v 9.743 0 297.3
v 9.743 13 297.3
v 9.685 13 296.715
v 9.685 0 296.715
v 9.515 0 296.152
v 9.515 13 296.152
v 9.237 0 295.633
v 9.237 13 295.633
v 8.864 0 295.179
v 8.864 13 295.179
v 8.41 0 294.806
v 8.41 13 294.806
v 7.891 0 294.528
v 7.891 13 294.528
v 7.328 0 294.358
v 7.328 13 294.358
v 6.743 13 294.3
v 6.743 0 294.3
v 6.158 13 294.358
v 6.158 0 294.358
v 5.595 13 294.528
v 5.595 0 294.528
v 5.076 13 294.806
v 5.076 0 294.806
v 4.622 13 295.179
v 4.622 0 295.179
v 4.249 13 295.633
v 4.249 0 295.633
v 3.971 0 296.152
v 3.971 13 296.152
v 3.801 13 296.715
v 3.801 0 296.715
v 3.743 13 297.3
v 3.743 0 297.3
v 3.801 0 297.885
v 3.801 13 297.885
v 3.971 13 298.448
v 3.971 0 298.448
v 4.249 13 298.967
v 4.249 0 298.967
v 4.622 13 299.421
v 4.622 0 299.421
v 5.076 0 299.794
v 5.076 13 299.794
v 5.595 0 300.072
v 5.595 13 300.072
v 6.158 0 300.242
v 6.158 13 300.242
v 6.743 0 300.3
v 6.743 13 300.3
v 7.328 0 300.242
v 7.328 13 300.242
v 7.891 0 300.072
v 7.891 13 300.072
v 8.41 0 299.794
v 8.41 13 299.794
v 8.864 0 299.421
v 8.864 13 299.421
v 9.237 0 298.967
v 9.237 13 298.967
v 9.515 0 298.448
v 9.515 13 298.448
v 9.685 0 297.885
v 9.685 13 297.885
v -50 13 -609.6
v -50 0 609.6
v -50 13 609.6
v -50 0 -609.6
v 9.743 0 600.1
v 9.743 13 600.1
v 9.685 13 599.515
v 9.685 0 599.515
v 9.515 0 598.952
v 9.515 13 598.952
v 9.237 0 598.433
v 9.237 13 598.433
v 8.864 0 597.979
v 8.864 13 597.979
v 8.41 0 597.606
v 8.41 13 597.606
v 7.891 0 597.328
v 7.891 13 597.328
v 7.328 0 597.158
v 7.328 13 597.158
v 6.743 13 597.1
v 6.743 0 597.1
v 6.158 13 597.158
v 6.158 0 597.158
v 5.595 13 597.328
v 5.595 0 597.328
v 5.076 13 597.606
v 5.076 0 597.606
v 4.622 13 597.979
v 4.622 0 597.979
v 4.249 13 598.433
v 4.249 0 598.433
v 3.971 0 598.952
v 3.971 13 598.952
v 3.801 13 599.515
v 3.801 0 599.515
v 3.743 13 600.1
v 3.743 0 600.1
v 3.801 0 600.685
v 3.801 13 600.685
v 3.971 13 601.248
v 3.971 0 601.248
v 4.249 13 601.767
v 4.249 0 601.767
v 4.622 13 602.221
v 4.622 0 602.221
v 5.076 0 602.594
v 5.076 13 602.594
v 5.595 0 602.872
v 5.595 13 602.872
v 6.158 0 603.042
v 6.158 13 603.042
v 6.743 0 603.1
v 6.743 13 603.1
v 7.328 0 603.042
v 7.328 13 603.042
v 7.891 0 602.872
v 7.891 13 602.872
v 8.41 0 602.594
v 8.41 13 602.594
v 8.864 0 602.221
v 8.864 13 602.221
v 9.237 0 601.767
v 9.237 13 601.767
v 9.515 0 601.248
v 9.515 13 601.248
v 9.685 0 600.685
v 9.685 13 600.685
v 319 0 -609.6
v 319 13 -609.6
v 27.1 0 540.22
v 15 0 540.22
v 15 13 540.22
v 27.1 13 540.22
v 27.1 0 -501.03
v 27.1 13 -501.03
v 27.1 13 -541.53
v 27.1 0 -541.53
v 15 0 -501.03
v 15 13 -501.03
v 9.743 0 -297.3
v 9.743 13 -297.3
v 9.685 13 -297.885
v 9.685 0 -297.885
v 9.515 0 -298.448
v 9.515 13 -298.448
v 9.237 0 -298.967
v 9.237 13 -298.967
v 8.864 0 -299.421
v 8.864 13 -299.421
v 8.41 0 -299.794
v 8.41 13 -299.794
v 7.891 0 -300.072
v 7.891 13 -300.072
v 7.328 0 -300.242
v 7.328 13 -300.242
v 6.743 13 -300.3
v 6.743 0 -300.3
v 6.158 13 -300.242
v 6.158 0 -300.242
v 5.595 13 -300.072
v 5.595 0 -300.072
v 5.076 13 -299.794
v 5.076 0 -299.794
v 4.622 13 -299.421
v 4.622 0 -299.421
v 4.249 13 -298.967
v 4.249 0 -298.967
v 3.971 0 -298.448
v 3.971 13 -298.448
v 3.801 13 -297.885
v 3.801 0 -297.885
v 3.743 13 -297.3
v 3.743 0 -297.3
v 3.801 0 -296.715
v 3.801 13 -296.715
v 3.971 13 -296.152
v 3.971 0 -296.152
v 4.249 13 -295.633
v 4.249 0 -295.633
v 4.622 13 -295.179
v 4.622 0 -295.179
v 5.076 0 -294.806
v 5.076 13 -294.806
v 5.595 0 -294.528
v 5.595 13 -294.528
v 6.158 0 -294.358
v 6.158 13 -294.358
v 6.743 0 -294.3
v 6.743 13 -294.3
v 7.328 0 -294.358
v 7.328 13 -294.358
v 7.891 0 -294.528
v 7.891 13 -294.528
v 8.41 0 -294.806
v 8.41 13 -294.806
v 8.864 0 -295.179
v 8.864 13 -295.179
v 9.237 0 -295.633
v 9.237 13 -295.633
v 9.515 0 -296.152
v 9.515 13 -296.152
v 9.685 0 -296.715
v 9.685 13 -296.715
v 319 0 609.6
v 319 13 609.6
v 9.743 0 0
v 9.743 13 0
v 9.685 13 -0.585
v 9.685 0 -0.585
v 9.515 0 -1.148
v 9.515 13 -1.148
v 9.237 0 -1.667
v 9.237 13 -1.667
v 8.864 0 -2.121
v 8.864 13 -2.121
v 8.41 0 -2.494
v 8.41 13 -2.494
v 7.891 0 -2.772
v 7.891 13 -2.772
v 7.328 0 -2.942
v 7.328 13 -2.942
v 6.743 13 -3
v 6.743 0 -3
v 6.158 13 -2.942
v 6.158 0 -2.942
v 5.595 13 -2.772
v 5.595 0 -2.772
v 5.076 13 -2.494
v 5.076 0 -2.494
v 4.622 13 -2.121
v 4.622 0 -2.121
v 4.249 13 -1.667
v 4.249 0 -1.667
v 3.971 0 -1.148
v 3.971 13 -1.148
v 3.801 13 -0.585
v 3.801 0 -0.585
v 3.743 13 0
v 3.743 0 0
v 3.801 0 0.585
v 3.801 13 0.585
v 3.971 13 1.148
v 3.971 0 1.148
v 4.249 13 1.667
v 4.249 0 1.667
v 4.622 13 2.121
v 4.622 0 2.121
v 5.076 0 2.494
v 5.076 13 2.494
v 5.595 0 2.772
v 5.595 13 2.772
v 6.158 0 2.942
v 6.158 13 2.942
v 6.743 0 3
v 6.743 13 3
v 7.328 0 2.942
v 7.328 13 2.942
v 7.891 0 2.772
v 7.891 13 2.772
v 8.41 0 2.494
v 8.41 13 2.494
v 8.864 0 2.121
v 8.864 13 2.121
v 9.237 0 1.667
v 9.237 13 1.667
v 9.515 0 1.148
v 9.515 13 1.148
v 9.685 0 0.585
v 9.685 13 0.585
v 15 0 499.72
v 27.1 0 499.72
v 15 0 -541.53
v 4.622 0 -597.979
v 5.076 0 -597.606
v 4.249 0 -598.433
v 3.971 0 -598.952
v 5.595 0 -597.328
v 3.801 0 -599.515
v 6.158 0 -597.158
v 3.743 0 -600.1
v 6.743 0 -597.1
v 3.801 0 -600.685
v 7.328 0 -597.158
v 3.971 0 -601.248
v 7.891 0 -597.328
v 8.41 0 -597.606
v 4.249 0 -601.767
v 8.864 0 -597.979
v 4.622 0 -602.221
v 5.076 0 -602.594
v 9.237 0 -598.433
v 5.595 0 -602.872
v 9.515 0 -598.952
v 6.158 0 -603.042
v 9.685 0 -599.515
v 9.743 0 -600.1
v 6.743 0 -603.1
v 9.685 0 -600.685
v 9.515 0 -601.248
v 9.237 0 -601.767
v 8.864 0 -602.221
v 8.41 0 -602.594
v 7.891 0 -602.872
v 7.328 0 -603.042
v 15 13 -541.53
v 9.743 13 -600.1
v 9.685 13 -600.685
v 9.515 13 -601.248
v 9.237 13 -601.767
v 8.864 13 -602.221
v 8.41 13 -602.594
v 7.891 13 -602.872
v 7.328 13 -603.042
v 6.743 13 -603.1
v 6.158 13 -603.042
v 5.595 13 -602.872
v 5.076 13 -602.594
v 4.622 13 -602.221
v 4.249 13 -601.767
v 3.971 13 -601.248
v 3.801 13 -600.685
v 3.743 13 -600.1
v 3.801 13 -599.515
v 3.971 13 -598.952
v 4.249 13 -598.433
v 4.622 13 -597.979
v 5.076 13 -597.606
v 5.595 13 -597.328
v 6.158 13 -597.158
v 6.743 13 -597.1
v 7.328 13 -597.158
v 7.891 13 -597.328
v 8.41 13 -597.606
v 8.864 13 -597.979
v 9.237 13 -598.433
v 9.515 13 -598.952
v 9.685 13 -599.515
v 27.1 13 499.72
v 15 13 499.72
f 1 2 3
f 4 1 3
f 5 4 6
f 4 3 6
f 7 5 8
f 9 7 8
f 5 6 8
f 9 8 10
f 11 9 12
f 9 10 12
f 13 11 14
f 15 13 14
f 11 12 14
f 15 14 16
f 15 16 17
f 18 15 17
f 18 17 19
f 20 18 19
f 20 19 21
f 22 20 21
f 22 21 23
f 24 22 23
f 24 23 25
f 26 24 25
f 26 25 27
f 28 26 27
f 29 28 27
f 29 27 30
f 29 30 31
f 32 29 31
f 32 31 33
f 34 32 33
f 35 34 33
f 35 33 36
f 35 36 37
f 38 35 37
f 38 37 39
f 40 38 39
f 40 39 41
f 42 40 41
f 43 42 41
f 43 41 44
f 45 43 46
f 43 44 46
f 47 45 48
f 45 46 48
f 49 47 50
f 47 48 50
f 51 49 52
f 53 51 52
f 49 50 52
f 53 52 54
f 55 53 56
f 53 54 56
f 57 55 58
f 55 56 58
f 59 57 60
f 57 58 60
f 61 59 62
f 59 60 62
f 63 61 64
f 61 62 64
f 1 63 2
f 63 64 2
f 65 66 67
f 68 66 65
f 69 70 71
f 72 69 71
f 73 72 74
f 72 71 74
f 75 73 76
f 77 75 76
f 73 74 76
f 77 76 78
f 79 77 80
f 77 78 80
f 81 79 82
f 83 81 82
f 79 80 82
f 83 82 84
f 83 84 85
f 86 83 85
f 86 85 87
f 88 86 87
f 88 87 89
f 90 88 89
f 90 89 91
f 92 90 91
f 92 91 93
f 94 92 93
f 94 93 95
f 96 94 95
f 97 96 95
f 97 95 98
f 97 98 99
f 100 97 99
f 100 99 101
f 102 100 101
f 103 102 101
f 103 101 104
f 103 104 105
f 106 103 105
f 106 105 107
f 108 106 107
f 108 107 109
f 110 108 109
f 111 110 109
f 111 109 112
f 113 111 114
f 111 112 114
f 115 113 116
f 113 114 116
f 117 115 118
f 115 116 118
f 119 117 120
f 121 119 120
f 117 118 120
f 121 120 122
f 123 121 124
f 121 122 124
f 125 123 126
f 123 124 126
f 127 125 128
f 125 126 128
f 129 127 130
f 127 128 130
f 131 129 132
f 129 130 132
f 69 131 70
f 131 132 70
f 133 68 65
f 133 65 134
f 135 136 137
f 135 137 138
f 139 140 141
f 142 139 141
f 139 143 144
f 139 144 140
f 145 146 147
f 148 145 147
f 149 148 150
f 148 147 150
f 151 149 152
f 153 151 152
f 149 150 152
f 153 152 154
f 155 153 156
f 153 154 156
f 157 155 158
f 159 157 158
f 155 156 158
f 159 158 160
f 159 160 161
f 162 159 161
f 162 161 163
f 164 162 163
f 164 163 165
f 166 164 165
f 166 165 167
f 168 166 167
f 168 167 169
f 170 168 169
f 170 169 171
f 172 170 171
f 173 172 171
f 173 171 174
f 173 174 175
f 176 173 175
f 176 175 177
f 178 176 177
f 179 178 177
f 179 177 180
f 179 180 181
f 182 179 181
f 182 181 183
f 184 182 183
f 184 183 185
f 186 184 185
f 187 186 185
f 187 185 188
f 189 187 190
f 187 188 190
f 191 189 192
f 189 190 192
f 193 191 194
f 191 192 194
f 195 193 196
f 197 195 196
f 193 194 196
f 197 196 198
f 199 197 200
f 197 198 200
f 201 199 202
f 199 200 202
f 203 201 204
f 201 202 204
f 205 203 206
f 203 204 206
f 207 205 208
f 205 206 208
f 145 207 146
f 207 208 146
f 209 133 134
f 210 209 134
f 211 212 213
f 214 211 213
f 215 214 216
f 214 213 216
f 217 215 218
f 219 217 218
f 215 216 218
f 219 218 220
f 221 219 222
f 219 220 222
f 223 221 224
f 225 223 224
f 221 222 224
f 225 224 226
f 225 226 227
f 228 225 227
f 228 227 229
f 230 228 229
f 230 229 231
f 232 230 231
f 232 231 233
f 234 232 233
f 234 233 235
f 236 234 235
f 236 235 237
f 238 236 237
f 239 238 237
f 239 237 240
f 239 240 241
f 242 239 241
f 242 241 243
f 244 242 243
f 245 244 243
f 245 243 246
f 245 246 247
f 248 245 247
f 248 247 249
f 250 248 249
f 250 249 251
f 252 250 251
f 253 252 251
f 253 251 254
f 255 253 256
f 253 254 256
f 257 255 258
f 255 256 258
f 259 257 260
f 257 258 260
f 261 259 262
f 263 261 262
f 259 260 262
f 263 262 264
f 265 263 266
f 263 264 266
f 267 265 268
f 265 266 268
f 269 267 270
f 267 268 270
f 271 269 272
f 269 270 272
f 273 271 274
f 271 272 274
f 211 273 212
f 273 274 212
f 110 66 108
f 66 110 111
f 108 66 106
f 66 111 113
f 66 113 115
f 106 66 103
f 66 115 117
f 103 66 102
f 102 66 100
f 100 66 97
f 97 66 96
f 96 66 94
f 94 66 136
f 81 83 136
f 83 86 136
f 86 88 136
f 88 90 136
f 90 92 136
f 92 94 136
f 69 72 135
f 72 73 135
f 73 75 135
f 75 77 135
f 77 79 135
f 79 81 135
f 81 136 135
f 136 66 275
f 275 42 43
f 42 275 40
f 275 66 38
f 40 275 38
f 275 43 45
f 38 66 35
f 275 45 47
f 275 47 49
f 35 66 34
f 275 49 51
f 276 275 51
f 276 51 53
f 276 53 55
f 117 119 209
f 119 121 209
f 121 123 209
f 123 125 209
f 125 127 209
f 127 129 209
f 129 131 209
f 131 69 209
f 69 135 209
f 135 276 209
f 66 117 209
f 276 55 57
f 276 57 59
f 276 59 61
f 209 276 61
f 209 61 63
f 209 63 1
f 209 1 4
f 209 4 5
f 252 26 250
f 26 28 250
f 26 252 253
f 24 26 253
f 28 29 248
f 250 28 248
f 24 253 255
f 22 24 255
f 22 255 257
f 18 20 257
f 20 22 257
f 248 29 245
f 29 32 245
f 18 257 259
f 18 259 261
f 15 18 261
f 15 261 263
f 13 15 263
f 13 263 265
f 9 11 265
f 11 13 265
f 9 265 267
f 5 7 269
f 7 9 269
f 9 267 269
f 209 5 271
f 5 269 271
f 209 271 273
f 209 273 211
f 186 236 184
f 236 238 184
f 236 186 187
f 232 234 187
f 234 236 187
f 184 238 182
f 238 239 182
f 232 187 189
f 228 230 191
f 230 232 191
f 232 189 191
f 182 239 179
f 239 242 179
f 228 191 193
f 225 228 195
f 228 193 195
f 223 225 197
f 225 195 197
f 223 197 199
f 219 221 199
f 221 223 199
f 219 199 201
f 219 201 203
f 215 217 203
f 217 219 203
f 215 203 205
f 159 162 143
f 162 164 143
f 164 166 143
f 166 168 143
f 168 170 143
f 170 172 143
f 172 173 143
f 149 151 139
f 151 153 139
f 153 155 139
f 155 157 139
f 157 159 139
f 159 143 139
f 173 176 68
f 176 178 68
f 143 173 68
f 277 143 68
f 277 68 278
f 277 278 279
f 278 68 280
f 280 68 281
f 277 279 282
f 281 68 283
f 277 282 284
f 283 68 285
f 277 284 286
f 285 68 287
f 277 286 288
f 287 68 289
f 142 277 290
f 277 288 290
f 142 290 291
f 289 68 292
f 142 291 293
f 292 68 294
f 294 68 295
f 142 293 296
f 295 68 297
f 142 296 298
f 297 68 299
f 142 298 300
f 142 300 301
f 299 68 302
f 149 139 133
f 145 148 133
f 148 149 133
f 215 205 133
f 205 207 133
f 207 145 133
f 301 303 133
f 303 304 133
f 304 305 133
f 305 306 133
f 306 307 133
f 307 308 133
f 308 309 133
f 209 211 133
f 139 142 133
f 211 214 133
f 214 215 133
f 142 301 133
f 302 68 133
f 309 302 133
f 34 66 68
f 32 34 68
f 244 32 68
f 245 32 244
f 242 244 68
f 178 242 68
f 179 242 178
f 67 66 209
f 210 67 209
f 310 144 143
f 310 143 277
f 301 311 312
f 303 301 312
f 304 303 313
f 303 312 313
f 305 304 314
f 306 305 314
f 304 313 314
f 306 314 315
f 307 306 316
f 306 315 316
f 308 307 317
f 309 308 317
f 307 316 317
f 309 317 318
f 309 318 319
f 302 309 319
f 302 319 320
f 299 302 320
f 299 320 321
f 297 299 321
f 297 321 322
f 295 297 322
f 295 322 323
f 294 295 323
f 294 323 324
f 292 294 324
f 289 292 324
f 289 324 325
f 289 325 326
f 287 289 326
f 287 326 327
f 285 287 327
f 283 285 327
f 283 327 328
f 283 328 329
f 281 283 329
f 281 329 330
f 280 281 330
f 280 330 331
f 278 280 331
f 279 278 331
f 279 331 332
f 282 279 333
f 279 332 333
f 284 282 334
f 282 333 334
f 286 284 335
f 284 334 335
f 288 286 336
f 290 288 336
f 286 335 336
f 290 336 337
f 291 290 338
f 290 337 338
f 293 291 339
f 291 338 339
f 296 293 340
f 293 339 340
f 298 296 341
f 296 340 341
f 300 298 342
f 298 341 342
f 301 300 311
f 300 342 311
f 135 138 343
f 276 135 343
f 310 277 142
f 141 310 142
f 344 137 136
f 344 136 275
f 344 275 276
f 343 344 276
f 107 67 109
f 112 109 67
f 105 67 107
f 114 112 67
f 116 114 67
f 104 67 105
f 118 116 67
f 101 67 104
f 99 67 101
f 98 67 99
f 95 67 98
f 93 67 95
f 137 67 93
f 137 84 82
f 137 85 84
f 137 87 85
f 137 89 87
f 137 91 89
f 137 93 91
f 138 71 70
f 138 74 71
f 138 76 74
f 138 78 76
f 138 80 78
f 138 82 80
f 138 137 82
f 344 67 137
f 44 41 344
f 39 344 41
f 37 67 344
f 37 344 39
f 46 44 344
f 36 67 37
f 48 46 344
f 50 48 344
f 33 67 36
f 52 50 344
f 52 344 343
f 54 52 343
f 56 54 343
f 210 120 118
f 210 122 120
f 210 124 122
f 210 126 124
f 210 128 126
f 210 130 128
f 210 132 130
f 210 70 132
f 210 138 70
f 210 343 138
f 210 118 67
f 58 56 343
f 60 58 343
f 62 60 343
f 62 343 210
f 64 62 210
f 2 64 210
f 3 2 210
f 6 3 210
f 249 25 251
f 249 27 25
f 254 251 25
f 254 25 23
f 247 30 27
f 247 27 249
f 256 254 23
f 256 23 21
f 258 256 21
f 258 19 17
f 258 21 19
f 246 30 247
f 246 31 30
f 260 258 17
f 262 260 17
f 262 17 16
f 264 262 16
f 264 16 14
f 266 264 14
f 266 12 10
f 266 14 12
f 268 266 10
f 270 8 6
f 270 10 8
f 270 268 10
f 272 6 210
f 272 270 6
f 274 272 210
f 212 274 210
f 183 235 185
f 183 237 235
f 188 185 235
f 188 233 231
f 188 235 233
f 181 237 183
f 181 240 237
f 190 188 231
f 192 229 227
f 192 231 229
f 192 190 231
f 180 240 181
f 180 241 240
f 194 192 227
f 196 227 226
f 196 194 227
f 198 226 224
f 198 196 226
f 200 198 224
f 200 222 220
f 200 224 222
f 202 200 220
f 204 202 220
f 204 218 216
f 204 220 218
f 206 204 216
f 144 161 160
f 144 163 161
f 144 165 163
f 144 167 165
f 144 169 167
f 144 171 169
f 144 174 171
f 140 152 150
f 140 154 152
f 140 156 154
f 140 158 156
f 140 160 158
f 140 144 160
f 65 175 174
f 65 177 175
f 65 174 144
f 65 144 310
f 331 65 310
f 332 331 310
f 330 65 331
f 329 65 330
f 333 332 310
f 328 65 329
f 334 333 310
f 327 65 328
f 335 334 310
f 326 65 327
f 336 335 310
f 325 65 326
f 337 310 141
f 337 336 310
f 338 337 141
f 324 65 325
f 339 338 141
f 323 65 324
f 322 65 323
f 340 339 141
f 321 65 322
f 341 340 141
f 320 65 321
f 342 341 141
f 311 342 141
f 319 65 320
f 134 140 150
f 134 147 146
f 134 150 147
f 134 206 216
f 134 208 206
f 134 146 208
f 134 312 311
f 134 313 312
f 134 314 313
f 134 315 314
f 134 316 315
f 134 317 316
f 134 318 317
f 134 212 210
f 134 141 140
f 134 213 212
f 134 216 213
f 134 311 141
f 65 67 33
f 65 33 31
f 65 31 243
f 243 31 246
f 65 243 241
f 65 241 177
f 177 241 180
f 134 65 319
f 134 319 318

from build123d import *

# Parameters (mm, degrees)
SKETCH1_W           = 100
SKETCH1_H           = 1219.2
BOSS_EXTRUDE1_DEPTH = 13
SKETCH4_R           = 3
CUT_EXTRUDE1_DEPTH  = 20
SKETCH5_W           = 279.735765028
SKETCH5_H           = 13
BOSS_EXTRUDE2_DEPTH = 1219.2
SKETCH6_W           = 12.1
SKETCH6_H           = 40.5
CUT_EXTRUDE2_DEPTH  = 20


with BuildPart() as part:
    # Sketch1 → Boss-Extrude1 (new body)
    with BuildSketch(Plane(origin=(0, 0, 0), x_dir=(1, 0, 0), z_dir=(0, 1, 0))):
        Rectangle(SKETCH1_W, SKETCH1_H)
    extrude(amount=BOSS_EXTRUDE1_DEPTH)

    # Sketch4 → Cut-Extrude1 (cut)
    with BuildSketch(Plane(origin=(0, 13, 0), x_dir=(1, 0, 0), z_dir=(0, 1, 0))):
        with Locations((6.742969062, -600.1)):
            Circle(SKETCH4_R)
        with Locations((6.742969062, -297.3)):
            Circle(SKETCH4_R)
        with Locations((6.742969062, 0)):
            Circle(SKETCH4_R)
        with Locations((6.742969062, 297.3)):
            Circle(SKETCH4_R)
        with Locations((6.742969062, 600.1)):
            Circle(SKETCH4_R)
    extrude(amount=-CUT_EXTRUDE1_DEPTH, mode=Mode.SUBTRACT)

    # Sketch5 → Boss-Extrude2 (add)
    with BuildSketch(Plane.XY.offset(609.6)):
        with Locations((179.132117486, 6.5)):
            Rectangle(SKETCH5_W, SKETCH5_H)
    extrude(amount=-BOSS_EXTRUDE2_DEPTH)

    # Sketch6 → Cut-Extrude2 (cut)
    with BuildSketch(Plane(origin=(0, 13, 0), x_dir=(1, 0, 0), z_dir=(0, 1, 0))):
        with Locations((21.05, -519.97)):
            Rectangle(SKETCH6_W, SKETCH6_H)
        with Locations((21.05, 521.28)):
            Rectangle(SKETCH6_W, SKETCH6_H)
    extrude(amount=-CUT_EXTRUDE2_DEPTH, mode=Mode.SUBTRACT)


solid = part.part
